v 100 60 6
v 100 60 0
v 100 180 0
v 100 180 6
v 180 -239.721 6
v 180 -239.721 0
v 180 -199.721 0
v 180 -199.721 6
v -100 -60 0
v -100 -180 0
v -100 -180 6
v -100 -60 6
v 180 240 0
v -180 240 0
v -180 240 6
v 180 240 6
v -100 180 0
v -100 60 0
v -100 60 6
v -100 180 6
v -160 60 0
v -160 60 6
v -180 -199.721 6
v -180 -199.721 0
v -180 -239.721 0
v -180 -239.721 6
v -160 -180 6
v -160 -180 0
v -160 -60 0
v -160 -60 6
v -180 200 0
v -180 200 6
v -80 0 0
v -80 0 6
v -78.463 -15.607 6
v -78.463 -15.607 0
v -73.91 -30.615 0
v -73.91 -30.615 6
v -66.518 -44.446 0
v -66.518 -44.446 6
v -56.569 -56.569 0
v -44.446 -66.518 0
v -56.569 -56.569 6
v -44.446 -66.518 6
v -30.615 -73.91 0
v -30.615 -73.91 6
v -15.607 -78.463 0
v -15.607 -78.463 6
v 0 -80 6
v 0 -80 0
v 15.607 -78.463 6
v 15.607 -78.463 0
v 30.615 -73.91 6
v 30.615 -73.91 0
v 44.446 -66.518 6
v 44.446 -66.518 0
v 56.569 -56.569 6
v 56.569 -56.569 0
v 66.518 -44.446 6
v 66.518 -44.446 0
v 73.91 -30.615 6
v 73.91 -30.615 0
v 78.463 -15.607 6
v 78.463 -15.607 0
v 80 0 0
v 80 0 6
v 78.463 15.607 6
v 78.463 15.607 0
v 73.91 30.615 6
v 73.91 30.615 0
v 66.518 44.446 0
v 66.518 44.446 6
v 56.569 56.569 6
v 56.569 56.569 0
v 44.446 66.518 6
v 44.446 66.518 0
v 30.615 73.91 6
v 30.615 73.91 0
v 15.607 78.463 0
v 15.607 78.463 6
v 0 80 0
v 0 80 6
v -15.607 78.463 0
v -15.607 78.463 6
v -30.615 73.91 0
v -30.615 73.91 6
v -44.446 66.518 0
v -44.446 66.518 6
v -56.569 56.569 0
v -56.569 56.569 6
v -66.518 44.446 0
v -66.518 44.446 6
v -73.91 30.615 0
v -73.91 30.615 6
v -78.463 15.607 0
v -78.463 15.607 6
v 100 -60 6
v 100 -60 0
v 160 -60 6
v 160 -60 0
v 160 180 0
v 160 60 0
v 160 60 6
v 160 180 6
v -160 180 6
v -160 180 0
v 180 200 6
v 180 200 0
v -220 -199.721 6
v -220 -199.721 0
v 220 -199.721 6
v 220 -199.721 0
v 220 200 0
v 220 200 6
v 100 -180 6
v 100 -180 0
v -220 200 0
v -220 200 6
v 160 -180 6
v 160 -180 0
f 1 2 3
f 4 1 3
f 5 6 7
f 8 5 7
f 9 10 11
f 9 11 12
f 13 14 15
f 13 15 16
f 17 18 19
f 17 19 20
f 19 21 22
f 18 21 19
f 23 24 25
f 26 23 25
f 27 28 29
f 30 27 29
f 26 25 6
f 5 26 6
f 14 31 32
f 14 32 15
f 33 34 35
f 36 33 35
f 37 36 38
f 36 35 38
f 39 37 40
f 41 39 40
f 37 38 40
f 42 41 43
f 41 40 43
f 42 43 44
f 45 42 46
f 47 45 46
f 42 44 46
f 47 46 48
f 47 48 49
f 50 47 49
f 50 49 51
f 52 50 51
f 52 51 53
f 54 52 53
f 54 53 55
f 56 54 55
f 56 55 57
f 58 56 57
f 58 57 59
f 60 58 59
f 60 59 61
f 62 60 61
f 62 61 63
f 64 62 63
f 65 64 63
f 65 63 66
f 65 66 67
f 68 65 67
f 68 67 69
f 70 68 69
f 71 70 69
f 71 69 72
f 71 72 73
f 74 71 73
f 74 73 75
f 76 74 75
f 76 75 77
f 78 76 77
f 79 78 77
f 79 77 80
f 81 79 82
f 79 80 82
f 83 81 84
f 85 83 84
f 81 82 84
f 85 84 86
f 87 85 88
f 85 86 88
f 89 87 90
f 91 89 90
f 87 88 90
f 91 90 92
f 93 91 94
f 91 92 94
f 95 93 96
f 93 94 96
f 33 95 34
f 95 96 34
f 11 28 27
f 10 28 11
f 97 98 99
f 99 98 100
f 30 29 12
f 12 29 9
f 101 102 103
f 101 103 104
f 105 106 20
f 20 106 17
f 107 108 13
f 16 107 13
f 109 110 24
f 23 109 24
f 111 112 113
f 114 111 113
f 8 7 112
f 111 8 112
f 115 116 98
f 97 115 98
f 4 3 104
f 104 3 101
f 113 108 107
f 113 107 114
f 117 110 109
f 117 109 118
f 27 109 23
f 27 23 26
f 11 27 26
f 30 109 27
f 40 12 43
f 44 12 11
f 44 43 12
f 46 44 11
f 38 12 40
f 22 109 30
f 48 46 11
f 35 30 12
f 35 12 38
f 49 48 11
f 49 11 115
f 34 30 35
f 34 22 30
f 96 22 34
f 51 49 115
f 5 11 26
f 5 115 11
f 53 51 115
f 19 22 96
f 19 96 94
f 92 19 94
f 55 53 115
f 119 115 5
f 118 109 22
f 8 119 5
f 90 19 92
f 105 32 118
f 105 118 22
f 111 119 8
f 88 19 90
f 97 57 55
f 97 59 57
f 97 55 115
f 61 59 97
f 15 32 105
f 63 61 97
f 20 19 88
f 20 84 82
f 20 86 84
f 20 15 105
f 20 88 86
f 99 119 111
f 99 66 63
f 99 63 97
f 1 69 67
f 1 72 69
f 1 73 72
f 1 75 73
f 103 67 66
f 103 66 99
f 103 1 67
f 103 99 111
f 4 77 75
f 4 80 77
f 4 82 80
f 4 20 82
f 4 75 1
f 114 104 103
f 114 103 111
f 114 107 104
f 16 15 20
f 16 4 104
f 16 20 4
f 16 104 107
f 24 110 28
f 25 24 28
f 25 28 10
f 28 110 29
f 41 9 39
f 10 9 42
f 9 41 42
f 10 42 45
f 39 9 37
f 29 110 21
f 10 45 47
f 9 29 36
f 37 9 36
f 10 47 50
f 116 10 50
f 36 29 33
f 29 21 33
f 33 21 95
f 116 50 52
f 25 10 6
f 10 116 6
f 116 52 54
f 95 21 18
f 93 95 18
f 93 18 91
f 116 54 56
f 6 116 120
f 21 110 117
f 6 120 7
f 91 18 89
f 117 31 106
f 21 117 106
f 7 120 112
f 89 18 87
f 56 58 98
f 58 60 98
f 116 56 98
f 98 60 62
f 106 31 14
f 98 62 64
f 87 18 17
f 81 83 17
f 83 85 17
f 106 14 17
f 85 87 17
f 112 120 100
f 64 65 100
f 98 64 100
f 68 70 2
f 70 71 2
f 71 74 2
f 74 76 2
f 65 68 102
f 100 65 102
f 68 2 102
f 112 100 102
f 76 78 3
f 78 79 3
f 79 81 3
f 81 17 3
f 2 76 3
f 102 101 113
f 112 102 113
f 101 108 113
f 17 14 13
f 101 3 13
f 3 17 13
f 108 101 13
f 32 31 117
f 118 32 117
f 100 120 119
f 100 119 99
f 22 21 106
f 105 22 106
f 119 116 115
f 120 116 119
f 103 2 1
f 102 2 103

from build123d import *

# Parameters (mm, degrees)
F0_W     = 360
F0_H     = 0.278708
F0_H_2   = 399.721292
F0_W_2   = 60
F0_H_3   = 120
F0_W_3   = 40
F0_H_4   = 40
F0_H_5   = 39.721292
F1_DEPTH = 6
F2_D     = 160


with BuildPart() as f1:
    # F0 (on Top) → F1 (new body)
    with BuildSketch(Plane.XY):
        with Locations((0, -199.860646)):
            Rectangle(F0_W, F0_H)
        with Locations((0, 0.139354)):
            Rectangle(F0_W, F0_H_2)
        with Locations((-130, -120)):
            Rectangle(F0_W_2, F0_H_3, mode=Mode.SUBTRACT)
        with Locations((130, -120)):
            Rectangle(F0_W_2, F0_H_3, mode=Mode.SUBTRACT)
        with Locations((-130, 120)):
            Rectangle(F0_W_2, F0_H_3, mode=Mode.SUBTRACT)
        with Locations((130, 120)):
            Rectangle(F0_W_2, F0_H_3, mode=Mode.SUBTRACT)
        with Locations((-200, 0.139354)):
            Rectangle(F0_W_3, F0_H_2)
        with Locations((0, 220)):
            Rectangle(F0_W, F0_H_4)
        with Locations((0, -219.860646)):
            Rectangle(F0_W, F0_H_5)
        with Locations((200, 0.139354)):
            Rectangle(F0_W_3, F0_H_2)
    extrude(amount=F1_DEPTH)

    # F2 (through all)
    with Locations(Plane(origin=(0, 0, 0), x_dir=(1, 0, 0), z_dir=(0, 0, -1))):
        with Locations((0, 0)):
            Hole(F2_D / 2)


solid = f1.part
